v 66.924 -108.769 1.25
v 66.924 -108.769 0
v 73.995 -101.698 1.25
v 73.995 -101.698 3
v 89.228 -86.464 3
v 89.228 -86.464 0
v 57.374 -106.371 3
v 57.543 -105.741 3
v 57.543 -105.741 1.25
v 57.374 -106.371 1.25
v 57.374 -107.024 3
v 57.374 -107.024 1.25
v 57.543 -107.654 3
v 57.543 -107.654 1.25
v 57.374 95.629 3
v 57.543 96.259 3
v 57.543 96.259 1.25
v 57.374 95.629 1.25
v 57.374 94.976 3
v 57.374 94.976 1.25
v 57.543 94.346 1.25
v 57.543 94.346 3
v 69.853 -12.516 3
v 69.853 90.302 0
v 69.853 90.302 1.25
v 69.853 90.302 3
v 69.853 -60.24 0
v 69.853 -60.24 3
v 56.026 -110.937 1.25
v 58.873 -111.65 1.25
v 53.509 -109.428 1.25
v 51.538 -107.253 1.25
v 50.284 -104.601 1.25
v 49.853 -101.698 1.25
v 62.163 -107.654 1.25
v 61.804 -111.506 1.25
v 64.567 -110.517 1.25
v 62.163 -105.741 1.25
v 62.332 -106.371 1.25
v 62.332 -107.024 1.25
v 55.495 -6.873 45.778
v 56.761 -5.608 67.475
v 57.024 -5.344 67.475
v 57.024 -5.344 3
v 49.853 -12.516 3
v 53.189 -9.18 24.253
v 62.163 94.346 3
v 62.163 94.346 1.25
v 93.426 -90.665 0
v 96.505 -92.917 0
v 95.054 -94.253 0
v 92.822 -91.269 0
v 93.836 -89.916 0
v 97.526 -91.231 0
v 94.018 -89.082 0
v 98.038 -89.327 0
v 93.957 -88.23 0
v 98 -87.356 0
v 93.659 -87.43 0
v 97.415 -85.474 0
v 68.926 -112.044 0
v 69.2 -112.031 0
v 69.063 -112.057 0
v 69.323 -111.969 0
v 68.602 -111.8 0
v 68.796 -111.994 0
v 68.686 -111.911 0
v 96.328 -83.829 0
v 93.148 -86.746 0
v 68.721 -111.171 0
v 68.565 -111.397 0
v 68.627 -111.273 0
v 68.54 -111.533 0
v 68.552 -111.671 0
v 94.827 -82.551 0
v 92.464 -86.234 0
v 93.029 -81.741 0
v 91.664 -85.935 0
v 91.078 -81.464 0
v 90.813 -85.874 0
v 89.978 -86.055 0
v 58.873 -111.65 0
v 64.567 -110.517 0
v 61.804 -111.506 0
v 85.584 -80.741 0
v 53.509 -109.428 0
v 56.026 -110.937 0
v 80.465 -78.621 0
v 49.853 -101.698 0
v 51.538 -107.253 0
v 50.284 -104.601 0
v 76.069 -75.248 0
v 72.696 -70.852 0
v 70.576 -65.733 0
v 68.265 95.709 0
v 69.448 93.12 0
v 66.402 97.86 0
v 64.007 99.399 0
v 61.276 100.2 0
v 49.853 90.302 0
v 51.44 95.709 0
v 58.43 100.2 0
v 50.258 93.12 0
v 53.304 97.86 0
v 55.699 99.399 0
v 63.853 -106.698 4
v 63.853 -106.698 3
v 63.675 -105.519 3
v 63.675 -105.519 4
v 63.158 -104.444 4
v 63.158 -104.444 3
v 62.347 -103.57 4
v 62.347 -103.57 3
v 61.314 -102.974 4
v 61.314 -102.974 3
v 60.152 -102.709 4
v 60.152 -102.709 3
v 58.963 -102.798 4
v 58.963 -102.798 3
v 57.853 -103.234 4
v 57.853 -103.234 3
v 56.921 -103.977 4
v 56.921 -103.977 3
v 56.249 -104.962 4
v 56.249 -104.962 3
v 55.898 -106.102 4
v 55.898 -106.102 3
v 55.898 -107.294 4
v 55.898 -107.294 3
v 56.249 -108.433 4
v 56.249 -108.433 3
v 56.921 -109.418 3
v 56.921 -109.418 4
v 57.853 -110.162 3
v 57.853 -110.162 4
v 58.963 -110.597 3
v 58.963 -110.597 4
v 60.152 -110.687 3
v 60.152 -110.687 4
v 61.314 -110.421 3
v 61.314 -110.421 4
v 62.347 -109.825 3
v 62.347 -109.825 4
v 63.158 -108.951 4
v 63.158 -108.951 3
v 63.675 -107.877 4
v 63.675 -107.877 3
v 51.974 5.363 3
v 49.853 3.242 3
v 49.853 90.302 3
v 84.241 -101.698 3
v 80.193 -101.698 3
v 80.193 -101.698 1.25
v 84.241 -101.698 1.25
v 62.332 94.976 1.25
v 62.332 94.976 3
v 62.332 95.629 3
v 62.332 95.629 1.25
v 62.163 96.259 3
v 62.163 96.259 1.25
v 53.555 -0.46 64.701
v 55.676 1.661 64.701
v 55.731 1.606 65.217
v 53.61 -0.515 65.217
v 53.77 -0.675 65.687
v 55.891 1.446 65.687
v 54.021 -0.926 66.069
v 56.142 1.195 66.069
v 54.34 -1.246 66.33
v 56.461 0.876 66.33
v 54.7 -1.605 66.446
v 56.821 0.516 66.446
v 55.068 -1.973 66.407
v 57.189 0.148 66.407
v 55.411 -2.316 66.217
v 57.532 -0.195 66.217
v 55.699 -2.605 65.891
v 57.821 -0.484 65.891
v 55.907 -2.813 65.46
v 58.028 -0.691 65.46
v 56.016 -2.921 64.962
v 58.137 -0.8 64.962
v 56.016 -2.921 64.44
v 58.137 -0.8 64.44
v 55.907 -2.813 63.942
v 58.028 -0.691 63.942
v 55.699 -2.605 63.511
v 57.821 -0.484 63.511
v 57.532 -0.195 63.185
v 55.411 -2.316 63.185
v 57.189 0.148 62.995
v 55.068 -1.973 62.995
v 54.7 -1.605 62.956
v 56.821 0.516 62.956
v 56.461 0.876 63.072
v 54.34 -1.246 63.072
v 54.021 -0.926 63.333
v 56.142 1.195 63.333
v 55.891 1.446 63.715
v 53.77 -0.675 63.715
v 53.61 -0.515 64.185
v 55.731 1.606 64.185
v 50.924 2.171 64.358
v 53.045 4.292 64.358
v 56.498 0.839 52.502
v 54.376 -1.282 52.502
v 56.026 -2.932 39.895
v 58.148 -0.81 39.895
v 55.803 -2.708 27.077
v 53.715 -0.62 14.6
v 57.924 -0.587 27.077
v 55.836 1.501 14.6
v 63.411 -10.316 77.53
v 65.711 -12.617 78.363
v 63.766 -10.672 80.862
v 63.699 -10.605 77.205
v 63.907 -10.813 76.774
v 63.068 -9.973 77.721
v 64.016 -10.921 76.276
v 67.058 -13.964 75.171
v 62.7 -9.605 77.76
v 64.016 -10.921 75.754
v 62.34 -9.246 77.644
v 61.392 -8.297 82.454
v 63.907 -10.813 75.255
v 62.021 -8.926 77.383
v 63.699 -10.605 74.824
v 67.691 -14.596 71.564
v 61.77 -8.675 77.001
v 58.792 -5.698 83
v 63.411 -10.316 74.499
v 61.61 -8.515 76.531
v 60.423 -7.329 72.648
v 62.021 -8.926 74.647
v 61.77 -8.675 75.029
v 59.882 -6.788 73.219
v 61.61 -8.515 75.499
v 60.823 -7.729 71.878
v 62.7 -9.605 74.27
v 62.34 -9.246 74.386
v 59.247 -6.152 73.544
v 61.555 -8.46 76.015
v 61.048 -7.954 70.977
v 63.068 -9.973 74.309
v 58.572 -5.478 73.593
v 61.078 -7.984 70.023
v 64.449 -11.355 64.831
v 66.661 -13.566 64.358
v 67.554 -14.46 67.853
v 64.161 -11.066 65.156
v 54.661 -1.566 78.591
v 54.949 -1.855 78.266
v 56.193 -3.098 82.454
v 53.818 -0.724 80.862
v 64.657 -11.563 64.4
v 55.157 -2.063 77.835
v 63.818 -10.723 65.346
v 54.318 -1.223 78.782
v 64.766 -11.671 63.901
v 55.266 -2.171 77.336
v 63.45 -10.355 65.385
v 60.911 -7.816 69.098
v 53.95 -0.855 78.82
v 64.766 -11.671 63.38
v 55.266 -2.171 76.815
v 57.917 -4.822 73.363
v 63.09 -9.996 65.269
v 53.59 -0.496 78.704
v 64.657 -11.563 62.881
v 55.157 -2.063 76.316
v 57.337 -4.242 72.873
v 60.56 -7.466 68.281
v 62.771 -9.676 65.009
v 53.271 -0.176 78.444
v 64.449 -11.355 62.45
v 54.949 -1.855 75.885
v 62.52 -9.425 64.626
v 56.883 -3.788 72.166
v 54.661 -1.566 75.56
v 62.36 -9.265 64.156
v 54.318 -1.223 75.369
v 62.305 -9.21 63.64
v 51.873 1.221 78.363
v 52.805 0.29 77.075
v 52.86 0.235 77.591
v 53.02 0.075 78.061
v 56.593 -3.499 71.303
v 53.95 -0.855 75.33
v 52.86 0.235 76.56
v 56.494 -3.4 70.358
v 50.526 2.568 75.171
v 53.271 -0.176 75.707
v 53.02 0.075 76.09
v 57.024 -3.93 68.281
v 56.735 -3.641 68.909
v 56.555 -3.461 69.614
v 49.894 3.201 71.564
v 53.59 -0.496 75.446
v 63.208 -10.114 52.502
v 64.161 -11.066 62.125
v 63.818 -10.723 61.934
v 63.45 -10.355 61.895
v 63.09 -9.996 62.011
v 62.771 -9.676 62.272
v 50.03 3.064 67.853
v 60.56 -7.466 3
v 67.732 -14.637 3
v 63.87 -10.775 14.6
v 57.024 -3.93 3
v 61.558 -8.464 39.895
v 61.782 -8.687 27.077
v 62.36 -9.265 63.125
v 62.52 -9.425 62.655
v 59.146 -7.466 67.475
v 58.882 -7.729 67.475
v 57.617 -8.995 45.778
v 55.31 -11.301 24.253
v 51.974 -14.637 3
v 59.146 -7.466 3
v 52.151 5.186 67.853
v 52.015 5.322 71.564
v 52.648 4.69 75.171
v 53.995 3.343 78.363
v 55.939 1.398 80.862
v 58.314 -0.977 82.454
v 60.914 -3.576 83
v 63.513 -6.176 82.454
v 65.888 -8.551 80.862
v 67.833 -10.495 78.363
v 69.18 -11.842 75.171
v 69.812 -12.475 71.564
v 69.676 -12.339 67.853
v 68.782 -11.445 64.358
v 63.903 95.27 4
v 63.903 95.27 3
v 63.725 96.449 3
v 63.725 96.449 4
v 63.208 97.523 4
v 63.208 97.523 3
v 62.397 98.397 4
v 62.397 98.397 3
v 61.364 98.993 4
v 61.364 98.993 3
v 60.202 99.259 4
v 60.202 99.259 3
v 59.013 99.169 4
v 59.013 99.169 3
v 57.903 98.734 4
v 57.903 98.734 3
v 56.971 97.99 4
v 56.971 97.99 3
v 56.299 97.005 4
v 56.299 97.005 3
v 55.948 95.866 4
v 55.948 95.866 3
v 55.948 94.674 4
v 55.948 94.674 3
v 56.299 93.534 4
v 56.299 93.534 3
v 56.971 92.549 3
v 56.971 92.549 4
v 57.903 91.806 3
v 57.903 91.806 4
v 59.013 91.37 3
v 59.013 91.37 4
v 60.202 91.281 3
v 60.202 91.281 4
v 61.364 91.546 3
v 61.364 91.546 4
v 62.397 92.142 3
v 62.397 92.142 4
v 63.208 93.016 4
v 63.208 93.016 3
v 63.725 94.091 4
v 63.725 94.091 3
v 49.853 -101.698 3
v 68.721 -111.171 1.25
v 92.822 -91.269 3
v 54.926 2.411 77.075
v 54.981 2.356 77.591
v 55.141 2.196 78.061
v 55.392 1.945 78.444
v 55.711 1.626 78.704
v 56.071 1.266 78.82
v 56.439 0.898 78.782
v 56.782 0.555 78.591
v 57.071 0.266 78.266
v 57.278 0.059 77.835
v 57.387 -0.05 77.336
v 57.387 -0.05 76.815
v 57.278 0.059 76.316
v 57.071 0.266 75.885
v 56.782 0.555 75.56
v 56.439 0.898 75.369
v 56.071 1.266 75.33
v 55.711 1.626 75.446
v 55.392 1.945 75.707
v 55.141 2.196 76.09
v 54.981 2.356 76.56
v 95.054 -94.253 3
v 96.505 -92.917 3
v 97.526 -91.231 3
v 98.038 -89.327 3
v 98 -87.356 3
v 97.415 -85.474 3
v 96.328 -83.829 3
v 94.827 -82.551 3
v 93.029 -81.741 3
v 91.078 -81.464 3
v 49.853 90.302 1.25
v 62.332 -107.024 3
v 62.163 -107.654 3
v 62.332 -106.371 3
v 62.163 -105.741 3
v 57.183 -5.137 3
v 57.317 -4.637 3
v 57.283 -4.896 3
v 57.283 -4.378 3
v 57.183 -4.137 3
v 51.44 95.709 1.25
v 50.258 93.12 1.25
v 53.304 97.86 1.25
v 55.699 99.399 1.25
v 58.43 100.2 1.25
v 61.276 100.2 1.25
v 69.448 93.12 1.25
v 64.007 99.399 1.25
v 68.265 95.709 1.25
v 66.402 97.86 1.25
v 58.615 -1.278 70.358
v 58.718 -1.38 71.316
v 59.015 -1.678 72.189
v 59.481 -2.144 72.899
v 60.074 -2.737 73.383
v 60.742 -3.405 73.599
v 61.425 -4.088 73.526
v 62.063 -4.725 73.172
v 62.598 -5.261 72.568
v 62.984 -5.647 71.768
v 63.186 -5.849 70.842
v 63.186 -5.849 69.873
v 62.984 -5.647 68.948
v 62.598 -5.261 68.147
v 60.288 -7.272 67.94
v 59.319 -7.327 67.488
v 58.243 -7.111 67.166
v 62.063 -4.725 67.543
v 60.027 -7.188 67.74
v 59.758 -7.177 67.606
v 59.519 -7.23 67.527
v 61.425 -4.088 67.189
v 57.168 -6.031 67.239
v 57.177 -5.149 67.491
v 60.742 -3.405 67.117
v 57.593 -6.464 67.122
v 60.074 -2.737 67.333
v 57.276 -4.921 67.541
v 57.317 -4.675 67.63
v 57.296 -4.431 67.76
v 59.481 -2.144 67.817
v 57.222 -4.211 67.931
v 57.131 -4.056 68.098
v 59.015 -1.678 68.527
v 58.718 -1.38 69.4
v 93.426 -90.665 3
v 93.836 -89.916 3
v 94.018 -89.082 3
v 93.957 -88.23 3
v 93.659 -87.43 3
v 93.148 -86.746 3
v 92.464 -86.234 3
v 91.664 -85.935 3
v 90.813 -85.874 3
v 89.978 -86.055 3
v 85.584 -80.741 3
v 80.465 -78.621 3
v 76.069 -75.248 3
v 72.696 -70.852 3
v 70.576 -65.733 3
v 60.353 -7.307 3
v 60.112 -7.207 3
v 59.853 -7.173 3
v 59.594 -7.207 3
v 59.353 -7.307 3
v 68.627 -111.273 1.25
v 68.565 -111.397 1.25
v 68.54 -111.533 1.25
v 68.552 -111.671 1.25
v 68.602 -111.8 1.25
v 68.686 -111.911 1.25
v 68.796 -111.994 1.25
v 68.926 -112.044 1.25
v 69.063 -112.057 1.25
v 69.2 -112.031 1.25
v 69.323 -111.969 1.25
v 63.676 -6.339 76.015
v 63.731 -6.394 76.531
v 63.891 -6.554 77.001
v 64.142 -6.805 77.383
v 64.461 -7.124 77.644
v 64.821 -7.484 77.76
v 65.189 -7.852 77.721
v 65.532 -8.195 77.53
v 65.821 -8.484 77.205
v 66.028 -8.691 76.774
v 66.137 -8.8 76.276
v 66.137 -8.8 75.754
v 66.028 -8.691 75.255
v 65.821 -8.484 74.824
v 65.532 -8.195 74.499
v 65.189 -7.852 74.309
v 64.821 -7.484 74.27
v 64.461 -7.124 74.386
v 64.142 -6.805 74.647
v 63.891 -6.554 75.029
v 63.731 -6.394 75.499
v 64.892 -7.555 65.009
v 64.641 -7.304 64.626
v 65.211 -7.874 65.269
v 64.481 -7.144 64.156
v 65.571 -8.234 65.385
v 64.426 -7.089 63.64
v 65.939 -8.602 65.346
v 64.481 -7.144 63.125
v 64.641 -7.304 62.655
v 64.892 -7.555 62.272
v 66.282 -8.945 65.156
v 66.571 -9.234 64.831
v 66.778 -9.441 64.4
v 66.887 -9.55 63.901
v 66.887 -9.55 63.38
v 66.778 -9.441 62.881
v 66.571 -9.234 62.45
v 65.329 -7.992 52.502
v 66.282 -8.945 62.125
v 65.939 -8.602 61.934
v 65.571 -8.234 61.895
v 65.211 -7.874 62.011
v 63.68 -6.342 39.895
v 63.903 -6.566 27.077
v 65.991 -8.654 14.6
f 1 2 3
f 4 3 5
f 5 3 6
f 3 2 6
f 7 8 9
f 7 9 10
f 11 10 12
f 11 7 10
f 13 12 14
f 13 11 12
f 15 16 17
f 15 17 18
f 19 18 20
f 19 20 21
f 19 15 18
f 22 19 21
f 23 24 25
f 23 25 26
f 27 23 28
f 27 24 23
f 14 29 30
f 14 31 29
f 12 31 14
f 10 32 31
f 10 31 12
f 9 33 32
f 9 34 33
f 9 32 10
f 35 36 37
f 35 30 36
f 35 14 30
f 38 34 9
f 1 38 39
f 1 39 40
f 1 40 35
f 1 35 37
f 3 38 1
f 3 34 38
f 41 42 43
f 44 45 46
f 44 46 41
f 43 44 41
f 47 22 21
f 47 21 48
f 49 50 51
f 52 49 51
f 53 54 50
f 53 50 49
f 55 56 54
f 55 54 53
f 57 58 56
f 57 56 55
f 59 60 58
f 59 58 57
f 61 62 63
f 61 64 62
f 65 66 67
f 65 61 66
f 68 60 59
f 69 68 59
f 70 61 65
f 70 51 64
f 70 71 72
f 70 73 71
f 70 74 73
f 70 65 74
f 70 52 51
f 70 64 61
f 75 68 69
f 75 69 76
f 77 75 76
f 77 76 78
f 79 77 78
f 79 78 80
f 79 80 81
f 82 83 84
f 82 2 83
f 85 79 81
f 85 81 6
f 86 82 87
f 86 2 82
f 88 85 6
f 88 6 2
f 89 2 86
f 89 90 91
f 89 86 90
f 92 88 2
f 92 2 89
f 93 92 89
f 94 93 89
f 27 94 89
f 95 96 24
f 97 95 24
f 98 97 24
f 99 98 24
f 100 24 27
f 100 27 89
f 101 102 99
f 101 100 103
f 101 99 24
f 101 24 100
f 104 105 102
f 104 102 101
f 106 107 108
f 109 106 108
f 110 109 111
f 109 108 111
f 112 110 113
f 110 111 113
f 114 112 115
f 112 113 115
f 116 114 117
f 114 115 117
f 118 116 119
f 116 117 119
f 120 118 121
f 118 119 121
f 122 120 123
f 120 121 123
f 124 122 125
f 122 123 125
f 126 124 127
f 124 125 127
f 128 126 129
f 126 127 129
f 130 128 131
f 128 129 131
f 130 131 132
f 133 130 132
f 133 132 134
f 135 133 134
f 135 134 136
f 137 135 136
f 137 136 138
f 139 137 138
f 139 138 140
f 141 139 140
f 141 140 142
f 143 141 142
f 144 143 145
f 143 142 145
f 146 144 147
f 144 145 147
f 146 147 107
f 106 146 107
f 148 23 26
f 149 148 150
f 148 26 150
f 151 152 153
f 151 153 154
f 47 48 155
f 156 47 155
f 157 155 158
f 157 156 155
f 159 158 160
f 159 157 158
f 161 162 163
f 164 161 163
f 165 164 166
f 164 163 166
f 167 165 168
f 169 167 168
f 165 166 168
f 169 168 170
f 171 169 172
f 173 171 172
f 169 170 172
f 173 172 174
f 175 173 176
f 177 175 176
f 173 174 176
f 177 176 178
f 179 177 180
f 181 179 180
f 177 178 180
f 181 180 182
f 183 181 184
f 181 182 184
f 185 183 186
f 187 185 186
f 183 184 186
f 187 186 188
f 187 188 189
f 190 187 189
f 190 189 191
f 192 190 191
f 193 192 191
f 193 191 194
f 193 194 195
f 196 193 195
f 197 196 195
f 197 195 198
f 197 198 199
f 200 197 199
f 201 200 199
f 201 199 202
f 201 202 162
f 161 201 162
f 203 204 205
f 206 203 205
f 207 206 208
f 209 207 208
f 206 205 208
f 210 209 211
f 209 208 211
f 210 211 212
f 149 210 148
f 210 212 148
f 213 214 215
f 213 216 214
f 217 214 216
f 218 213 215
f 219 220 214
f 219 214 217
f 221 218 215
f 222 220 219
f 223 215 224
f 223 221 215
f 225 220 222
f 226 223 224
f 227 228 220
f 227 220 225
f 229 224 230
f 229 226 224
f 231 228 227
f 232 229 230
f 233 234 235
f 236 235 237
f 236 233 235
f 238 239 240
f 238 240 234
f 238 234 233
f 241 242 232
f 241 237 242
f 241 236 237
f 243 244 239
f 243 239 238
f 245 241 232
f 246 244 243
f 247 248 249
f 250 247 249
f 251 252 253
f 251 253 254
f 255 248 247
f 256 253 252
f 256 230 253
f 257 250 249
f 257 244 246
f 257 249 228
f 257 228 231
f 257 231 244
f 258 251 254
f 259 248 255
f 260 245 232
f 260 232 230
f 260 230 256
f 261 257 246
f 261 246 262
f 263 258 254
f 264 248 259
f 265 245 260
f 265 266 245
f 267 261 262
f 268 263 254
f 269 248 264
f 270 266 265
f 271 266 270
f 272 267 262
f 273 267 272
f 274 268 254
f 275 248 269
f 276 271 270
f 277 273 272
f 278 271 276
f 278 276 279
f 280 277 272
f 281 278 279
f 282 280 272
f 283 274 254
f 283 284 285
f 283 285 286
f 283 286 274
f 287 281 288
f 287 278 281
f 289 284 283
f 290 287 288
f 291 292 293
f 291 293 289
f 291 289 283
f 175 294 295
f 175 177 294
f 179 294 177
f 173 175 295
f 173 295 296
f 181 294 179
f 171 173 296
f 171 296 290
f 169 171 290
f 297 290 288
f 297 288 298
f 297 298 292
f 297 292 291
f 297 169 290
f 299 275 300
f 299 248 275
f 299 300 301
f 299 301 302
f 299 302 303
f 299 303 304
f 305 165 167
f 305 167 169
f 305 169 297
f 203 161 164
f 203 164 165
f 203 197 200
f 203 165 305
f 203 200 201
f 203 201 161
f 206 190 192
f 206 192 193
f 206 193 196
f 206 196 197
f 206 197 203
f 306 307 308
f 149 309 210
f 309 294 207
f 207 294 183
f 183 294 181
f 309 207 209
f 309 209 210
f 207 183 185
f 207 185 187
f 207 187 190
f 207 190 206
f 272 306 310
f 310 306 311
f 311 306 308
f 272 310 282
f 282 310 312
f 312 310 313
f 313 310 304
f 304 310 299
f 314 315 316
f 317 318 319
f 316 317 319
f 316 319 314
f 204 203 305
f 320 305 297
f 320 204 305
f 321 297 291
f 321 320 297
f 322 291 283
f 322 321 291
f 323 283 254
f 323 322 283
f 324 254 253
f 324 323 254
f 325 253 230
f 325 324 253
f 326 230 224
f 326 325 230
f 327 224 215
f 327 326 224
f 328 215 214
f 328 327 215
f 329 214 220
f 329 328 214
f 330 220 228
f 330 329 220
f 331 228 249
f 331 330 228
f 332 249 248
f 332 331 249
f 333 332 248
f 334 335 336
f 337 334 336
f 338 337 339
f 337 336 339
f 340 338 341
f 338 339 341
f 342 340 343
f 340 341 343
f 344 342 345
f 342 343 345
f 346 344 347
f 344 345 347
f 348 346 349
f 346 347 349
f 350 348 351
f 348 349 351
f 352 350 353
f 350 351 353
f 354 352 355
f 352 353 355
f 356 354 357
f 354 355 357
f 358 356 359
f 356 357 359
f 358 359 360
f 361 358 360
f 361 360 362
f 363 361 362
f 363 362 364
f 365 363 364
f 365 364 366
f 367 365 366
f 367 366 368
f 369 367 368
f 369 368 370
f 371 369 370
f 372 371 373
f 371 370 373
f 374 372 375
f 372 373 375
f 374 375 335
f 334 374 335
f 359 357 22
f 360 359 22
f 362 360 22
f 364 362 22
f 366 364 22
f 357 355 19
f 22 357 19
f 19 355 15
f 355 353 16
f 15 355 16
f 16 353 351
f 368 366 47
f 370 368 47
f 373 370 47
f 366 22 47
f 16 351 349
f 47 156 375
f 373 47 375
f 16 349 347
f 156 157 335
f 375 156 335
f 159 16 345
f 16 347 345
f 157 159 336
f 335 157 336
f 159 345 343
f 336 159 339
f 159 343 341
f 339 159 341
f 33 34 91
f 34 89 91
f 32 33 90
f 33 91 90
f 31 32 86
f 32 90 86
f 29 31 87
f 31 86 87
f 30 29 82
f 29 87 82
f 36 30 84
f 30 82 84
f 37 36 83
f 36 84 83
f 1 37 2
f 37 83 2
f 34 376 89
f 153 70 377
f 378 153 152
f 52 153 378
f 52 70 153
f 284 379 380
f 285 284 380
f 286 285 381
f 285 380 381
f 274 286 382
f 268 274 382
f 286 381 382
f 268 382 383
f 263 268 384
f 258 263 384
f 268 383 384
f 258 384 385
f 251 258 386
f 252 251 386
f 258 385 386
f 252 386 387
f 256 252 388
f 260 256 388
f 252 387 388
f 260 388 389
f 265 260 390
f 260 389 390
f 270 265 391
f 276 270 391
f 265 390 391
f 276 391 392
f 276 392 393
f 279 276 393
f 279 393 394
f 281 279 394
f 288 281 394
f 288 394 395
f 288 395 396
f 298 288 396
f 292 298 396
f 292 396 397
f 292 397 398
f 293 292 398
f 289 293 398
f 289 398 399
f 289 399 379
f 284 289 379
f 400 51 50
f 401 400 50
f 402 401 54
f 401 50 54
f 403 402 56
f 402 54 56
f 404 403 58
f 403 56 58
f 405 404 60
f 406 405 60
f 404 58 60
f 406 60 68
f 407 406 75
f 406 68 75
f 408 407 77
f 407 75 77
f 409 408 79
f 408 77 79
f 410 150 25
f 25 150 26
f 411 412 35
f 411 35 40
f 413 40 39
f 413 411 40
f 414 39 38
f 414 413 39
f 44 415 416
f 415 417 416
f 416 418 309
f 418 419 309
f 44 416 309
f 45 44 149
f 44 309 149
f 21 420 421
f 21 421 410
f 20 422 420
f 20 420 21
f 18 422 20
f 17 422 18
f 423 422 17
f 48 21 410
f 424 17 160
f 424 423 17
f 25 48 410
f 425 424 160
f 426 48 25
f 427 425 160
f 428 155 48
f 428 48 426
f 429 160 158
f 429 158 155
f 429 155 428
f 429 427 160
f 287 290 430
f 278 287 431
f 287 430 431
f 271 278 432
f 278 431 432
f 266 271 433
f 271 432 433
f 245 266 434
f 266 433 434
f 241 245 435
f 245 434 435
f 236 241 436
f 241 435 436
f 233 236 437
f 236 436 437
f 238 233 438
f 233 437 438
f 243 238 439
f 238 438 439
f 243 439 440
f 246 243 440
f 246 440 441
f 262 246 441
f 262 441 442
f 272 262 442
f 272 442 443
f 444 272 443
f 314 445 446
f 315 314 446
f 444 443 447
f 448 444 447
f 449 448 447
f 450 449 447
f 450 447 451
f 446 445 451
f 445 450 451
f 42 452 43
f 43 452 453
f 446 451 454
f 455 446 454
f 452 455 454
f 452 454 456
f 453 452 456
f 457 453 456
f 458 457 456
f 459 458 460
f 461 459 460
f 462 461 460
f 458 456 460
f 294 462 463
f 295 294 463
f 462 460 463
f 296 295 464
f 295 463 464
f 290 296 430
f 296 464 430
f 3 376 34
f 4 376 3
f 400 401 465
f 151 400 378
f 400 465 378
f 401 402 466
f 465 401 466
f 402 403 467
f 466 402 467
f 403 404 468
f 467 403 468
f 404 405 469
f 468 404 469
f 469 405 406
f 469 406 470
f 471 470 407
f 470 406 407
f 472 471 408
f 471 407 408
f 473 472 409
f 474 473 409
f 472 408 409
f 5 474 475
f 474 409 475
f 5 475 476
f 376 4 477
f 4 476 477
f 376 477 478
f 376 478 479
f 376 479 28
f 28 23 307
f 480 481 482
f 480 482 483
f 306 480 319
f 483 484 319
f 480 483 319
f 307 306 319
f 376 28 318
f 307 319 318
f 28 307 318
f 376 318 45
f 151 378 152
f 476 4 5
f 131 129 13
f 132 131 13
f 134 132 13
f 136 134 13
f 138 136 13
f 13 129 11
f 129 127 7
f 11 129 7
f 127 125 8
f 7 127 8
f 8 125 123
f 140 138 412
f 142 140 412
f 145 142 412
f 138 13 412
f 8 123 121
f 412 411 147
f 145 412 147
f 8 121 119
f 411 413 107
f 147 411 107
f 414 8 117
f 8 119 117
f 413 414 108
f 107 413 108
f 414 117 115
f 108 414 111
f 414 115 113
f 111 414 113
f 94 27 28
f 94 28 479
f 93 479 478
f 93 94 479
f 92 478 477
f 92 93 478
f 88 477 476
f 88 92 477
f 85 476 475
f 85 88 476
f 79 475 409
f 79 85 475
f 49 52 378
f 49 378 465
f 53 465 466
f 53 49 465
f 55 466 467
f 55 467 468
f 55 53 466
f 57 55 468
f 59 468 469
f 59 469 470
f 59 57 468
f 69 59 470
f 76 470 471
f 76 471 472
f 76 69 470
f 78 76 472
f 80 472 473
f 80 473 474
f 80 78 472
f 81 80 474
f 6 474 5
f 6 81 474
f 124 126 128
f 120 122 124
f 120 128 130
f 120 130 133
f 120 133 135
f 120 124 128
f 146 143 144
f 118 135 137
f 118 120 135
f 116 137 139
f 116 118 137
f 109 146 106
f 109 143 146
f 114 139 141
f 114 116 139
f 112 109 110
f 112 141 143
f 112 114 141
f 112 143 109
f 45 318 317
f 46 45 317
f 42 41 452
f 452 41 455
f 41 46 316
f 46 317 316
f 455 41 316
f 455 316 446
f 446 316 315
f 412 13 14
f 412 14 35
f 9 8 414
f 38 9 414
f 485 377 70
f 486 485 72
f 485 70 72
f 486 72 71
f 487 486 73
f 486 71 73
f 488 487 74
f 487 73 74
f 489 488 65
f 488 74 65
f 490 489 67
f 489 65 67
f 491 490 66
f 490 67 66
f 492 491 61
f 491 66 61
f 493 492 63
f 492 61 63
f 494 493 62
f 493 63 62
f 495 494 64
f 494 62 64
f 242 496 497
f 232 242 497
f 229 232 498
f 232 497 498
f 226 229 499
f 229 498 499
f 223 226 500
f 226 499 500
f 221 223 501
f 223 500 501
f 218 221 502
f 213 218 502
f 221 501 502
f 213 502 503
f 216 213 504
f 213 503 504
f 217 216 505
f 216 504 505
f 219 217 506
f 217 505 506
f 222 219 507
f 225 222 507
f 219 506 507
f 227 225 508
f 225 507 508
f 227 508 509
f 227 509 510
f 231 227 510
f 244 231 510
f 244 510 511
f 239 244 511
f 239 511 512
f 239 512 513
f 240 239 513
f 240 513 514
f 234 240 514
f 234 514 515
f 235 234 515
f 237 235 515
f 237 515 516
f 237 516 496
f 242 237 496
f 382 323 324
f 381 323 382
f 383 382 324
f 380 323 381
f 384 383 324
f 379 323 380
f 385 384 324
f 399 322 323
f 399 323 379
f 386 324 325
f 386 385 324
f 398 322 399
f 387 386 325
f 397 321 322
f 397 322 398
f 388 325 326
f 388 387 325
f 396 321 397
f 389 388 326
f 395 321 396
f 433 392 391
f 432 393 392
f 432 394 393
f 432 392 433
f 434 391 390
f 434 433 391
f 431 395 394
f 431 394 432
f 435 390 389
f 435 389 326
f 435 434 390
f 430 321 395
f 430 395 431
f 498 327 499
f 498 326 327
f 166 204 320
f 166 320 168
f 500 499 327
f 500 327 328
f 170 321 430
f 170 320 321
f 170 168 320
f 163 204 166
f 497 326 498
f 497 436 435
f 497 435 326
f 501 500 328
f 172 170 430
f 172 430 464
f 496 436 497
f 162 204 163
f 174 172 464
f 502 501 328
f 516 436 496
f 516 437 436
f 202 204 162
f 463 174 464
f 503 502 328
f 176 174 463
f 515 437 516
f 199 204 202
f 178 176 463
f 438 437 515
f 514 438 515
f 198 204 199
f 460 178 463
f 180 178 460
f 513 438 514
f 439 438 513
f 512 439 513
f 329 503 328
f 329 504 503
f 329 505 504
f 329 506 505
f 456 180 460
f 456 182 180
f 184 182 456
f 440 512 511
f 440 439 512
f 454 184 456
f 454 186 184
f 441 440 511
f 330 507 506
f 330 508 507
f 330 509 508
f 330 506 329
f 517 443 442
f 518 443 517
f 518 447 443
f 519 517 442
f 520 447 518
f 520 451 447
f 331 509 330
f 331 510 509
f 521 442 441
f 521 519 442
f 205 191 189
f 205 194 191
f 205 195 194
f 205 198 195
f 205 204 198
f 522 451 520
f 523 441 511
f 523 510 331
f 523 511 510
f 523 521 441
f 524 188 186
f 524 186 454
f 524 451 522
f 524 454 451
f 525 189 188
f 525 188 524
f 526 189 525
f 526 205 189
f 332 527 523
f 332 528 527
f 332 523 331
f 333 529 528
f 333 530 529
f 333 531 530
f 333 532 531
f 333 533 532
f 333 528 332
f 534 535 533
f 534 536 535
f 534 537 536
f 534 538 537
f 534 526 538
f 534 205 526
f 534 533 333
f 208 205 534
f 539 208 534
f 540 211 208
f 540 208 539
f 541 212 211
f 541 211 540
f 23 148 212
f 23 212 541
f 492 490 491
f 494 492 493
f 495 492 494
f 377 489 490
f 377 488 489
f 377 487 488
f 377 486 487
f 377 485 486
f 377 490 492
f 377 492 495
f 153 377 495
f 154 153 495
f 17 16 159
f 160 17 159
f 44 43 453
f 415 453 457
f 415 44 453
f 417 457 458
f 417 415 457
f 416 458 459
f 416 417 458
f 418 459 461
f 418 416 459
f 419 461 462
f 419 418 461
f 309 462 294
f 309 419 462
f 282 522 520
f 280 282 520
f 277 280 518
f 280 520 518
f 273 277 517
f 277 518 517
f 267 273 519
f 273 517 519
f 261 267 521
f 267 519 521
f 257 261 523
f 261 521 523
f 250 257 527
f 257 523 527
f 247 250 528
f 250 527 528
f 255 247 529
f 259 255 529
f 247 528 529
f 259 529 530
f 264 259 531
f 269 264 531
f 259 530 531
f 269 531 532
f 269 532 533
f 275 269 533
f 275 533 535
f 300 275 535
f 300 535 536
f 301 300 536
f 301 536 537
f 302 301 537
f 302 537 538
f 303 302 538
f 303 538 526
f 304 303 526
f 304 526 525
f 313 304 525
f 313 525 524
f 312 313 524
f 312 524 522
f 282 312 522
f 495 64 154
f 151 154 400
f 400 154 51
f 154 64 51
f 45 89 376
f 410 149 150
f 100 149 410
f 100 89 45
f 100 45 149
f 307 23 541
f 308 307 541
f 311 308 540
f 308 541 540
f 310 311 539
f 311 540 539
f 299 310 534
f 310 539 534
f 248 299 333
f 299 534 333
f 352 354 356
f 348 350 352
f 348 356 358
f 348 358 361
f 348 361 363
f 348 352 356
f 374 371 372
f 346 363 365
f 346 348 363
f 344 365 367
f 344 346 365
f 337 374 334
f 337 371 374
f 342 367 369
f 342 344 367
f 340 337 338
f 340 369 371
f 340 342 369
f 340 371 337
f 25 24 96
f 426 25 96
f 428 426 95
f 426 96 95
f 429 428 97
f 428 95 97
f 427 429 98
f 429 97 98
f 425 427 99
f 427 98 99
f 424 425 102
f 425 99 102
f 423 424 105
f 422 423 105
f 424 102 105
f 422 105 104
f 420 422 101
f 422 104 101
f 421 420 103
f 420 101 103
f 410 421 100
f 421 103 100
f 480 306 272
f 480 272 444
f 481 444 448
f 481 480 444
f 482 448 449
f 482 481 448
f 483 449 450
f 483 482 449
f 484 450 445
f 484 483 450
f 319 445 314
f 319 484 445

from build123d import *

# Parameters (mm, degrees)
PAD_DEPTH       = 3
SKETCH001_R     = 2.5
POCKET_DEPTH    = 1.75
SKETCH002_W     = 40.796986
SKETCH002_H     = 14.7225289338
SKETCH002_R     = 2.5
POCKET001_DEPTH = 1.75
PAD001_DEPTH    = 80
SKETCH004_R     = 3.25
SKETCH004_R_2   = 1.75
POCKET002_DEPTH = 10
POCKET003_DEPTH = 10
SKETCH006_W     = 28.387858
SKETCH006_H     = 15.2811819657
POCKET004_DEPTH = 5
POCKET005_DEPTH = 1.75
SKETCH009_R     = 4
PAD002_DEPTH    = 1
POCKET006_DEPTH = 1.75
SKETCH011_R     = 4
PAD003_DEPTH    = 1


with BuildPart() as part:
    # Sketch → Pad (new body)
    with BuildSketch(Plane.XY):
        with BuildLine():
            Line((69.8529072407, 90.3022552924), (69.8529072407, -60.2396425339))
            ThreePointArc((69.8529072407, -60.2396425339), (76.0694675014, -75.2477458977), (91.0775708651, -81.4643061584))
            ThreePointArc((95.0544059368, -94.2525047463), (97.7737123274, -86.3944117953), (91.0775708651, -81.4643061584))
            Line((69.323459293, -111.9691907389), (95.0544059368, -94.2525047464))
            ThreePointArc((68.7209640656, -111.1710682539), (68.6401936472, -111.8585113494), (69.323459293, -111.9691907389))
            Line((68.7209640656, -111.1710682539), (92.8224674077, -91.2688103099))
            ThreePointArc((92.8224674077, -91.2688103099), (93.4277261515, -87.0695649029), (89.2284807399, -86.4643061907))
            Line((66.9239707498, -108.7688161808), (89.2284807722, -86.4643061584))
            ThreePointArc((49.8529072407, -101.697743289), (56.0260697472, -110.9365380783), (66.9239707498, -108.7688161808))
            Line((49.8529072407, -101.697743289), (49.8529072407, 90.3022566385))
            ThreePointArc((69.8529072407, 90.3022552924), (59.8529079137, 100.3022559338), (49.8529072407, 90.3022566385))
        make_face()
    extrude(amount=PAD_DEPTH)

    # Sketch001 → Pocket (cut)
    with BuildSketch(Plane.XY.offset(3)):
        with BuildLine():
            ThreePointArc((69.8529072407, 90.3022552924), (59.8529079137, 100.3022559338), (49.8529072407, 90.3022566385))
            Line((49.8529072407, 90.3022566385), (69.8529072407, 90.3022552924))
        make_face()
        with Locations((59.8529072407, 95.3022559338)):
            Circle(SKETCH001_R, mode=Mode.SUBTRACT)
    extrude(amount=-POCKET_DEPTH, mode=Mode.SUBTRACT)

    # Sketch002 → Pocket001 (cut)
    with BuildSketch(Plane.XY.offset(3)):
        with Locations((66.517767, -109.0590085331)):
            Rectangle(SKETCH002_W, SKETCH002_H)
        with Locations((59.8529072407, -106.6977440662)):
            Circle(SKETCH002_R, mode=Mode.SUBTRACT)
    extrude(amount=-POCKET001_DEPTH, mode=Mode.SUBTRACT)

    # Sketch007 → Pad001 (new body)
    with BuildSketch(Plane.XY.offset(3)):
        with BuildLine():
            Line((51.9742275842, 5.3629168103), (69.8529072407, -12.5157628462))
            Line((69.8529072407, -12.5157628462), (67.7315868971, -14.6370831897))
            Line((67.7315868971, -14.6370831897), (60.5600140219, -7.4655103145))
            ThreePointArc((60.5600140219, -7.4655103145), (59.8529072407, -7.1726170956), (59.1458004595, -7.4655103145))
            Line((51.9742275842, -14.6370831897), (59.1458004595, -7.4655103145))
            Line((49.8529072407, -12.5157628462), (51.9742275842, -14.6370831897))
            Line((49.8529072407, -12.5157628462), (57.0244801159, -5.3441899709))
            ThreePointArc((57.0244801159, -5.3441899709), (57.3173733348, -4.6370831897), (57.0244801159, -3.9299764085))
            Line((57.0244801159, -3.9299764085), (49.8529072407, 3.2415964667))
            Line((49.8529072407, 3.2415964667), (51.9742275842, 5.3629168103))
        make_face()
    extrude(amount=PAD001_DEPTH)

    # Sketch004 → Pocket002 (cut)
    with BuildSketch(Plane(origin=(28.6685721973, 28.6685721973, 0), x_dir=(-0.7071067812, 0.7071067812, 0), z_dir=(0.7071067812, 0.7071067812, 0))):
        with Locations((-45.601309552, 70.3578643763)):
            Circle(SKETCH004_R)
        with Locations((-39.9444553025, 64.7010101268)):
            Circle(SKETCH004_R_2)
        with Locations((-38.8837951307, 77.0753787975)):
            Circle(SKETCH004_R_2)
        with Locations((-51.2581638015, 76.0147186258)):
            Circle(SKETCH004_R_2)
        with Locations((-52.3188239733, 63.640349955)):
            Circle(SKETCH004_R_2)
        with BuildLine():
            Line((-75.5394739283, 92.3788), (-18.7021739283, 92.3788))
            Line((-18.7021739283, 92.3788), (-18.7021739283, 3))
            Line((-18.7021739283, 3), (-32.9591739283, 3))
            ThreePointArc((-34.4737045478, 64.3578643762), (-41.8644390608, 33.4778105333), (-32.9591739283, 3.0000000001))
            ThreePointArc((-34.4737045478, 64.3578643763), (-45.601309552, 83), (-56.7289145562, 64.3578643763))
            ThreePointArc((-58.2434451757, 3.0000000001), (-49.3381806572, 33.4778105485), (-56.7289145562, 64.3578643762))
            Line((-58.2434451757, 3), (-75.5394739283, 3))
            Line((-75.5394739283, 3), (-75.5394739283, 92.3788))
        make_face()
    extrude(amount=-POCKET002_DEPTH, mode=Mode.SUBTRACT)

    # Sketch005 → Pocket003 (cut)
    with BuildSketch(Plane(origin=(33.305655387, -33.305655387, 0), x_dir=(0.7071067812, 0.7071067812, 0), z_dir=(0.7071067812, -0.7071067812, 0))):
        with BuildLine():
            Line((23.5109279915, 83.5), (26.4013479915, 3))
            ThreePointArc((26.4013479915, 3.0000000001), (33.9978224249, 42.6348277252), (36.5434836152, 82.9106964523))
            Line((36.5434836152, 82.9106964523), (36.5434836152, 83.5))
            Line((36.5434836152, 83.5), (23.5109279915, 83.5))
        make_face()
    extrude(amount=-POCKET003_DEPTH, mode=Mode.SUBTRACT)

    # Sketch006 → Pocket004 (cut)
    with BuildSketch(Plane(origin=(26.5472518537, 26.5472518537, 0), x_dir=(0.7071067812, -0.7071067812, 0), z_dir=(-0.7071067812, -0.7071067812, 0))):
        with Locations((45.583672552, 77.9984553591)):
            Rectangle(SKETCH006_W, SKETCH006_H)
    extrude(amount=POCKET004_DEPTH, mode=Mode.SUBTRACT)

    # Sketch008 → Pocket005 (cut)
    with BuildSketch(Plane.XY.offset(3)):
        with BuildLine():
            Line((57.5432084738, 96.2589646702), (62.1626061364, 96.2589643593))
            ThreePointArc((62.1626061364, 96.2589643593), (59.852907409, 97.8022559338), (57.5432084738, 96.2589646702))
        make_face()
        with BuildLine():
            Line((57.543208345, 94.3455475084), (62.1626060076, 94.3455471974))
            ThreePointArc((57.543208345, 94.3455475084), (59.8529070724, 92.8022559338), (62.1626060076, 94.3455471974))
        make_face()
    extrude(amount=-POCKET005_DEPTH, mode=Mode.SUBTRACT)

    # Sketch009 → Pad002 (new body)
    with BuildSketch(Plane.XY.offset(3)):
        with Locations((59.90292, 95.269699)):
            Circle(SKETCH009_R)
    extrude(amount=PAD002_DEPTH)

    # Sketch010 → Pocket006 (cut)
    with BuildSketch(Plane.XY.offset(3)):
        with BuildLine():
            Line((57.5432084094, -105.7410354853), (62.162606072, -105.7410354853))
            ThreePointArc((62.162606072, -105.7410354853), (59.8529072407, -104.1977440662), (57.5432084094, -105.7410354853))
        make_face()
        with BuildLine():
            Line((57.5432084094, -107.6544526471), (62.162606072, -107.6544526471))
            ThreePointArc((57.5432084094, -107.6544526471), (59.8529072407, -109.1977440662), (62.162606072, -107.6544526471))
        make_face()
    extrude(amount=-POCKET006_DEPTH, mode=Mode.SUBTRACT)

    # Sketch011 → Pad003 (new body)
    with BuildSketch(Plane.XY.offset(3)):
        with Locations((59.8529072407, -106.6977440662)):
            Circle(SKETCH011_R)
    extrude(amount=PAD003_DEPTH)


solid = part.part
